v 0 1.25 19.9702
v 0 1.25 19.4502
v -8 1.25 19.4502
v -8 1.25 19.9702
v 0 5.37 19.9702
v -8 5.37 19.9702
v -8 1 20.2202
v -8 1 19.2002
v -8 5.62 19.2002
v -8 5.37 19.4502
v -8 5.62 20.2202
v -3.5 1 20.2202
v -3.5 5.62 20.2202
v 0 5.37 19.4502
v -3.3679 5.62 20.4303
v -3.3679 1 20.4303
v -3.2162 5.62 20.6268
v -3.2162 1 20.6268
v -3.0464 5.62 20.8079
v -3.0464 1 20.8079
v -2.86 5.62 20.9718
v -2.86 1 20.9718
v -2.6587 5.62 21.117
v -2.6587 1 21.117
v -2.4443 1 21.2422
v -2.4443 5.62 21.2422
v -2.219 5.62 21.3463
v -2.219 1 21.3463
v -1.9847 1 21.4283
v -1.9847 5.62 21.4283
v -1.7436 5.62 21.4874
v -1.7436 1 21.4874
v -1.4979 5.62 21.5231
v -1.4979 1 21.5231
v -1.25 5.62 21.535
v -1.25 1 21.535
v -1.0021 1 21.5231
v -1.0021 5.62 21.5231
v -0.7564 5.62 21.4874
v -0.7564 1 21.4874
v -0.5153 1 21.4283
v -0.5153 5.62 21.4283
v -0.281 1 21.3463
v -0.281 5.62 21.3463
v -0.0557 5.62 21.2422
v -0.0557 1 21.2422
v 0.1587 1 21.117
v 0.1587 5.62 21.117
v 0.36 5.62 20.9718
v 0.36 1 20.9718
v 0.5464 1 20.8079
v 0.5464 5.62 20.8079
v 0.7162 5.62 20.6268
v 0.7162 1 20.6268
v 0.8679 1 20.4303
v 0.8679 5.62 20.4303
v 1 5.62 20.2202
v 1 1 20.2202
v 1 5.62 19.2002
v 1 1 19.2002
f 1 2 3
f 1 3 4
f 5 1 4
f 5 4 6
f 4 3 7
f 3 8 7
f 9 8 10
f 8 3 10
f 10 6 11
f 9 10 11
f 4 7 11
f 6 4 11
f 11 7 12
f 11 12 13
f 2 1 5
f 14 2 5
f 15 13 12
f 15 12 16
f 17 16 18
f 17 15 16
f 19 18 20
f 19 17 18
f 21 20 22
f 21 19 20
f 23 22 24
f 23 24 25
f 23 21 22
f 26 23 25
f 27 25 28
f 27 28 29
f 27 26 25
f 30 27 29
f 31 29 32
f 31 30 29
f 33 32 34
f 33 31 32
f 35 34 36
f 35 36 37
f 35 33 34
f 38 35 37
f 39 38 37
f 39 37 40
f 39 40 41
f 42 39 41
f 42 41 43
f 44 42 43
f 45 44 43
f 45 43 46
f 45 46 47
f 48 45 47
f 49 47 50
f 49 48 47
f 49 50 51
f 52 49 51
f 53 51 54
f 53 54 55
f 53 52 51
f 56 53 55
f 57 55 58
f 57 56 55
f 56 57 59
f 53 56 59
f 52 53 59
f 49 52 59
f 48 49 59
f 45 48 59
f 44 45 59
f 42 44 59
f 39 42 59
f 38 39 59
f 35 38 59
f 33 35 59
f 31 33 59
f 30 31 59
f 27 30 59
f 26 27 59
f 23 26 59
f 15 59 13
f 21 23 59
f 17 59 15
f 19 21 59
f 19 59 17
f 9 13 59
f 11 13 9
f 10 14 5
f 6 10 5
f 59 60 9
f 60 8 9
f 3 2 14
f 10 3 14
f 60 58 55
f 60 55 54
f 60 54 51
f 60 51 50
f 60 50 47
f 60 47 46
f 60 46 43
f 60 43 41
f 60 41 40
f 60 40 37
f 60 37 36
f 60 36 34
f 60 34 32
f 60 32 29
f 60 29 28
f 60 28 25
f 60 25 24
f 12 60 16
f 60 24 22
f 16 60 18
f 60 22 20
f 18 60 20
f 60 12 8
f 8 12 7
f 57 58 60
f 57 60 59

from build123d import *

# Parameters (mm, degrees)
F0_W     = 4.62
F0_H     = 1.02
F0_W_2   = 4.12
F0_H_2   = 0.52
F1_DEPTH = 8
F2_W     = 4.62
F2_H     = 1.02
F3_DEPTH = 1
F5_DEPTH = 4.62


with BuildPart() as f1:
    # F0 (on Right) → F1 (new body)
    with BuildSketch(Plane.YZ):
        with Locations((3.31, 19.710189)):
            Rectangle(F0_W, F0_H)
        with Locations((3.31, 19.710189)):
            Rectangle(F0_W_2, F0_H_2, mode=Mode.SUBTRACT)
    extrude(amount=-F1_DEPTH)

    # F2 (on face) → F3 (join)
    with BuildSketch(Plane.YZ):
        with Locations((3.31, 19.710189)):
            Rectangle(F2_W, F2_H)
    extrude(amount=F3_DEPTH)

    # F4 (on face) → F5 (join)
    with BuildSketch(Plane(origin=(0, 5.62, 0), x_dir=(-1, 0, 0), z_dir=(0, 1, 0))):
        with BuildLine():
            Line((-1, 20.220189), (3.5, 20.220189))
            ThreePointArc((3.5, 20.220189), (1.25, 21.535009), (-1, 20.220189))
        make_face()
    extrude(amount=-F5_DEPTH)


solid = f1.part
